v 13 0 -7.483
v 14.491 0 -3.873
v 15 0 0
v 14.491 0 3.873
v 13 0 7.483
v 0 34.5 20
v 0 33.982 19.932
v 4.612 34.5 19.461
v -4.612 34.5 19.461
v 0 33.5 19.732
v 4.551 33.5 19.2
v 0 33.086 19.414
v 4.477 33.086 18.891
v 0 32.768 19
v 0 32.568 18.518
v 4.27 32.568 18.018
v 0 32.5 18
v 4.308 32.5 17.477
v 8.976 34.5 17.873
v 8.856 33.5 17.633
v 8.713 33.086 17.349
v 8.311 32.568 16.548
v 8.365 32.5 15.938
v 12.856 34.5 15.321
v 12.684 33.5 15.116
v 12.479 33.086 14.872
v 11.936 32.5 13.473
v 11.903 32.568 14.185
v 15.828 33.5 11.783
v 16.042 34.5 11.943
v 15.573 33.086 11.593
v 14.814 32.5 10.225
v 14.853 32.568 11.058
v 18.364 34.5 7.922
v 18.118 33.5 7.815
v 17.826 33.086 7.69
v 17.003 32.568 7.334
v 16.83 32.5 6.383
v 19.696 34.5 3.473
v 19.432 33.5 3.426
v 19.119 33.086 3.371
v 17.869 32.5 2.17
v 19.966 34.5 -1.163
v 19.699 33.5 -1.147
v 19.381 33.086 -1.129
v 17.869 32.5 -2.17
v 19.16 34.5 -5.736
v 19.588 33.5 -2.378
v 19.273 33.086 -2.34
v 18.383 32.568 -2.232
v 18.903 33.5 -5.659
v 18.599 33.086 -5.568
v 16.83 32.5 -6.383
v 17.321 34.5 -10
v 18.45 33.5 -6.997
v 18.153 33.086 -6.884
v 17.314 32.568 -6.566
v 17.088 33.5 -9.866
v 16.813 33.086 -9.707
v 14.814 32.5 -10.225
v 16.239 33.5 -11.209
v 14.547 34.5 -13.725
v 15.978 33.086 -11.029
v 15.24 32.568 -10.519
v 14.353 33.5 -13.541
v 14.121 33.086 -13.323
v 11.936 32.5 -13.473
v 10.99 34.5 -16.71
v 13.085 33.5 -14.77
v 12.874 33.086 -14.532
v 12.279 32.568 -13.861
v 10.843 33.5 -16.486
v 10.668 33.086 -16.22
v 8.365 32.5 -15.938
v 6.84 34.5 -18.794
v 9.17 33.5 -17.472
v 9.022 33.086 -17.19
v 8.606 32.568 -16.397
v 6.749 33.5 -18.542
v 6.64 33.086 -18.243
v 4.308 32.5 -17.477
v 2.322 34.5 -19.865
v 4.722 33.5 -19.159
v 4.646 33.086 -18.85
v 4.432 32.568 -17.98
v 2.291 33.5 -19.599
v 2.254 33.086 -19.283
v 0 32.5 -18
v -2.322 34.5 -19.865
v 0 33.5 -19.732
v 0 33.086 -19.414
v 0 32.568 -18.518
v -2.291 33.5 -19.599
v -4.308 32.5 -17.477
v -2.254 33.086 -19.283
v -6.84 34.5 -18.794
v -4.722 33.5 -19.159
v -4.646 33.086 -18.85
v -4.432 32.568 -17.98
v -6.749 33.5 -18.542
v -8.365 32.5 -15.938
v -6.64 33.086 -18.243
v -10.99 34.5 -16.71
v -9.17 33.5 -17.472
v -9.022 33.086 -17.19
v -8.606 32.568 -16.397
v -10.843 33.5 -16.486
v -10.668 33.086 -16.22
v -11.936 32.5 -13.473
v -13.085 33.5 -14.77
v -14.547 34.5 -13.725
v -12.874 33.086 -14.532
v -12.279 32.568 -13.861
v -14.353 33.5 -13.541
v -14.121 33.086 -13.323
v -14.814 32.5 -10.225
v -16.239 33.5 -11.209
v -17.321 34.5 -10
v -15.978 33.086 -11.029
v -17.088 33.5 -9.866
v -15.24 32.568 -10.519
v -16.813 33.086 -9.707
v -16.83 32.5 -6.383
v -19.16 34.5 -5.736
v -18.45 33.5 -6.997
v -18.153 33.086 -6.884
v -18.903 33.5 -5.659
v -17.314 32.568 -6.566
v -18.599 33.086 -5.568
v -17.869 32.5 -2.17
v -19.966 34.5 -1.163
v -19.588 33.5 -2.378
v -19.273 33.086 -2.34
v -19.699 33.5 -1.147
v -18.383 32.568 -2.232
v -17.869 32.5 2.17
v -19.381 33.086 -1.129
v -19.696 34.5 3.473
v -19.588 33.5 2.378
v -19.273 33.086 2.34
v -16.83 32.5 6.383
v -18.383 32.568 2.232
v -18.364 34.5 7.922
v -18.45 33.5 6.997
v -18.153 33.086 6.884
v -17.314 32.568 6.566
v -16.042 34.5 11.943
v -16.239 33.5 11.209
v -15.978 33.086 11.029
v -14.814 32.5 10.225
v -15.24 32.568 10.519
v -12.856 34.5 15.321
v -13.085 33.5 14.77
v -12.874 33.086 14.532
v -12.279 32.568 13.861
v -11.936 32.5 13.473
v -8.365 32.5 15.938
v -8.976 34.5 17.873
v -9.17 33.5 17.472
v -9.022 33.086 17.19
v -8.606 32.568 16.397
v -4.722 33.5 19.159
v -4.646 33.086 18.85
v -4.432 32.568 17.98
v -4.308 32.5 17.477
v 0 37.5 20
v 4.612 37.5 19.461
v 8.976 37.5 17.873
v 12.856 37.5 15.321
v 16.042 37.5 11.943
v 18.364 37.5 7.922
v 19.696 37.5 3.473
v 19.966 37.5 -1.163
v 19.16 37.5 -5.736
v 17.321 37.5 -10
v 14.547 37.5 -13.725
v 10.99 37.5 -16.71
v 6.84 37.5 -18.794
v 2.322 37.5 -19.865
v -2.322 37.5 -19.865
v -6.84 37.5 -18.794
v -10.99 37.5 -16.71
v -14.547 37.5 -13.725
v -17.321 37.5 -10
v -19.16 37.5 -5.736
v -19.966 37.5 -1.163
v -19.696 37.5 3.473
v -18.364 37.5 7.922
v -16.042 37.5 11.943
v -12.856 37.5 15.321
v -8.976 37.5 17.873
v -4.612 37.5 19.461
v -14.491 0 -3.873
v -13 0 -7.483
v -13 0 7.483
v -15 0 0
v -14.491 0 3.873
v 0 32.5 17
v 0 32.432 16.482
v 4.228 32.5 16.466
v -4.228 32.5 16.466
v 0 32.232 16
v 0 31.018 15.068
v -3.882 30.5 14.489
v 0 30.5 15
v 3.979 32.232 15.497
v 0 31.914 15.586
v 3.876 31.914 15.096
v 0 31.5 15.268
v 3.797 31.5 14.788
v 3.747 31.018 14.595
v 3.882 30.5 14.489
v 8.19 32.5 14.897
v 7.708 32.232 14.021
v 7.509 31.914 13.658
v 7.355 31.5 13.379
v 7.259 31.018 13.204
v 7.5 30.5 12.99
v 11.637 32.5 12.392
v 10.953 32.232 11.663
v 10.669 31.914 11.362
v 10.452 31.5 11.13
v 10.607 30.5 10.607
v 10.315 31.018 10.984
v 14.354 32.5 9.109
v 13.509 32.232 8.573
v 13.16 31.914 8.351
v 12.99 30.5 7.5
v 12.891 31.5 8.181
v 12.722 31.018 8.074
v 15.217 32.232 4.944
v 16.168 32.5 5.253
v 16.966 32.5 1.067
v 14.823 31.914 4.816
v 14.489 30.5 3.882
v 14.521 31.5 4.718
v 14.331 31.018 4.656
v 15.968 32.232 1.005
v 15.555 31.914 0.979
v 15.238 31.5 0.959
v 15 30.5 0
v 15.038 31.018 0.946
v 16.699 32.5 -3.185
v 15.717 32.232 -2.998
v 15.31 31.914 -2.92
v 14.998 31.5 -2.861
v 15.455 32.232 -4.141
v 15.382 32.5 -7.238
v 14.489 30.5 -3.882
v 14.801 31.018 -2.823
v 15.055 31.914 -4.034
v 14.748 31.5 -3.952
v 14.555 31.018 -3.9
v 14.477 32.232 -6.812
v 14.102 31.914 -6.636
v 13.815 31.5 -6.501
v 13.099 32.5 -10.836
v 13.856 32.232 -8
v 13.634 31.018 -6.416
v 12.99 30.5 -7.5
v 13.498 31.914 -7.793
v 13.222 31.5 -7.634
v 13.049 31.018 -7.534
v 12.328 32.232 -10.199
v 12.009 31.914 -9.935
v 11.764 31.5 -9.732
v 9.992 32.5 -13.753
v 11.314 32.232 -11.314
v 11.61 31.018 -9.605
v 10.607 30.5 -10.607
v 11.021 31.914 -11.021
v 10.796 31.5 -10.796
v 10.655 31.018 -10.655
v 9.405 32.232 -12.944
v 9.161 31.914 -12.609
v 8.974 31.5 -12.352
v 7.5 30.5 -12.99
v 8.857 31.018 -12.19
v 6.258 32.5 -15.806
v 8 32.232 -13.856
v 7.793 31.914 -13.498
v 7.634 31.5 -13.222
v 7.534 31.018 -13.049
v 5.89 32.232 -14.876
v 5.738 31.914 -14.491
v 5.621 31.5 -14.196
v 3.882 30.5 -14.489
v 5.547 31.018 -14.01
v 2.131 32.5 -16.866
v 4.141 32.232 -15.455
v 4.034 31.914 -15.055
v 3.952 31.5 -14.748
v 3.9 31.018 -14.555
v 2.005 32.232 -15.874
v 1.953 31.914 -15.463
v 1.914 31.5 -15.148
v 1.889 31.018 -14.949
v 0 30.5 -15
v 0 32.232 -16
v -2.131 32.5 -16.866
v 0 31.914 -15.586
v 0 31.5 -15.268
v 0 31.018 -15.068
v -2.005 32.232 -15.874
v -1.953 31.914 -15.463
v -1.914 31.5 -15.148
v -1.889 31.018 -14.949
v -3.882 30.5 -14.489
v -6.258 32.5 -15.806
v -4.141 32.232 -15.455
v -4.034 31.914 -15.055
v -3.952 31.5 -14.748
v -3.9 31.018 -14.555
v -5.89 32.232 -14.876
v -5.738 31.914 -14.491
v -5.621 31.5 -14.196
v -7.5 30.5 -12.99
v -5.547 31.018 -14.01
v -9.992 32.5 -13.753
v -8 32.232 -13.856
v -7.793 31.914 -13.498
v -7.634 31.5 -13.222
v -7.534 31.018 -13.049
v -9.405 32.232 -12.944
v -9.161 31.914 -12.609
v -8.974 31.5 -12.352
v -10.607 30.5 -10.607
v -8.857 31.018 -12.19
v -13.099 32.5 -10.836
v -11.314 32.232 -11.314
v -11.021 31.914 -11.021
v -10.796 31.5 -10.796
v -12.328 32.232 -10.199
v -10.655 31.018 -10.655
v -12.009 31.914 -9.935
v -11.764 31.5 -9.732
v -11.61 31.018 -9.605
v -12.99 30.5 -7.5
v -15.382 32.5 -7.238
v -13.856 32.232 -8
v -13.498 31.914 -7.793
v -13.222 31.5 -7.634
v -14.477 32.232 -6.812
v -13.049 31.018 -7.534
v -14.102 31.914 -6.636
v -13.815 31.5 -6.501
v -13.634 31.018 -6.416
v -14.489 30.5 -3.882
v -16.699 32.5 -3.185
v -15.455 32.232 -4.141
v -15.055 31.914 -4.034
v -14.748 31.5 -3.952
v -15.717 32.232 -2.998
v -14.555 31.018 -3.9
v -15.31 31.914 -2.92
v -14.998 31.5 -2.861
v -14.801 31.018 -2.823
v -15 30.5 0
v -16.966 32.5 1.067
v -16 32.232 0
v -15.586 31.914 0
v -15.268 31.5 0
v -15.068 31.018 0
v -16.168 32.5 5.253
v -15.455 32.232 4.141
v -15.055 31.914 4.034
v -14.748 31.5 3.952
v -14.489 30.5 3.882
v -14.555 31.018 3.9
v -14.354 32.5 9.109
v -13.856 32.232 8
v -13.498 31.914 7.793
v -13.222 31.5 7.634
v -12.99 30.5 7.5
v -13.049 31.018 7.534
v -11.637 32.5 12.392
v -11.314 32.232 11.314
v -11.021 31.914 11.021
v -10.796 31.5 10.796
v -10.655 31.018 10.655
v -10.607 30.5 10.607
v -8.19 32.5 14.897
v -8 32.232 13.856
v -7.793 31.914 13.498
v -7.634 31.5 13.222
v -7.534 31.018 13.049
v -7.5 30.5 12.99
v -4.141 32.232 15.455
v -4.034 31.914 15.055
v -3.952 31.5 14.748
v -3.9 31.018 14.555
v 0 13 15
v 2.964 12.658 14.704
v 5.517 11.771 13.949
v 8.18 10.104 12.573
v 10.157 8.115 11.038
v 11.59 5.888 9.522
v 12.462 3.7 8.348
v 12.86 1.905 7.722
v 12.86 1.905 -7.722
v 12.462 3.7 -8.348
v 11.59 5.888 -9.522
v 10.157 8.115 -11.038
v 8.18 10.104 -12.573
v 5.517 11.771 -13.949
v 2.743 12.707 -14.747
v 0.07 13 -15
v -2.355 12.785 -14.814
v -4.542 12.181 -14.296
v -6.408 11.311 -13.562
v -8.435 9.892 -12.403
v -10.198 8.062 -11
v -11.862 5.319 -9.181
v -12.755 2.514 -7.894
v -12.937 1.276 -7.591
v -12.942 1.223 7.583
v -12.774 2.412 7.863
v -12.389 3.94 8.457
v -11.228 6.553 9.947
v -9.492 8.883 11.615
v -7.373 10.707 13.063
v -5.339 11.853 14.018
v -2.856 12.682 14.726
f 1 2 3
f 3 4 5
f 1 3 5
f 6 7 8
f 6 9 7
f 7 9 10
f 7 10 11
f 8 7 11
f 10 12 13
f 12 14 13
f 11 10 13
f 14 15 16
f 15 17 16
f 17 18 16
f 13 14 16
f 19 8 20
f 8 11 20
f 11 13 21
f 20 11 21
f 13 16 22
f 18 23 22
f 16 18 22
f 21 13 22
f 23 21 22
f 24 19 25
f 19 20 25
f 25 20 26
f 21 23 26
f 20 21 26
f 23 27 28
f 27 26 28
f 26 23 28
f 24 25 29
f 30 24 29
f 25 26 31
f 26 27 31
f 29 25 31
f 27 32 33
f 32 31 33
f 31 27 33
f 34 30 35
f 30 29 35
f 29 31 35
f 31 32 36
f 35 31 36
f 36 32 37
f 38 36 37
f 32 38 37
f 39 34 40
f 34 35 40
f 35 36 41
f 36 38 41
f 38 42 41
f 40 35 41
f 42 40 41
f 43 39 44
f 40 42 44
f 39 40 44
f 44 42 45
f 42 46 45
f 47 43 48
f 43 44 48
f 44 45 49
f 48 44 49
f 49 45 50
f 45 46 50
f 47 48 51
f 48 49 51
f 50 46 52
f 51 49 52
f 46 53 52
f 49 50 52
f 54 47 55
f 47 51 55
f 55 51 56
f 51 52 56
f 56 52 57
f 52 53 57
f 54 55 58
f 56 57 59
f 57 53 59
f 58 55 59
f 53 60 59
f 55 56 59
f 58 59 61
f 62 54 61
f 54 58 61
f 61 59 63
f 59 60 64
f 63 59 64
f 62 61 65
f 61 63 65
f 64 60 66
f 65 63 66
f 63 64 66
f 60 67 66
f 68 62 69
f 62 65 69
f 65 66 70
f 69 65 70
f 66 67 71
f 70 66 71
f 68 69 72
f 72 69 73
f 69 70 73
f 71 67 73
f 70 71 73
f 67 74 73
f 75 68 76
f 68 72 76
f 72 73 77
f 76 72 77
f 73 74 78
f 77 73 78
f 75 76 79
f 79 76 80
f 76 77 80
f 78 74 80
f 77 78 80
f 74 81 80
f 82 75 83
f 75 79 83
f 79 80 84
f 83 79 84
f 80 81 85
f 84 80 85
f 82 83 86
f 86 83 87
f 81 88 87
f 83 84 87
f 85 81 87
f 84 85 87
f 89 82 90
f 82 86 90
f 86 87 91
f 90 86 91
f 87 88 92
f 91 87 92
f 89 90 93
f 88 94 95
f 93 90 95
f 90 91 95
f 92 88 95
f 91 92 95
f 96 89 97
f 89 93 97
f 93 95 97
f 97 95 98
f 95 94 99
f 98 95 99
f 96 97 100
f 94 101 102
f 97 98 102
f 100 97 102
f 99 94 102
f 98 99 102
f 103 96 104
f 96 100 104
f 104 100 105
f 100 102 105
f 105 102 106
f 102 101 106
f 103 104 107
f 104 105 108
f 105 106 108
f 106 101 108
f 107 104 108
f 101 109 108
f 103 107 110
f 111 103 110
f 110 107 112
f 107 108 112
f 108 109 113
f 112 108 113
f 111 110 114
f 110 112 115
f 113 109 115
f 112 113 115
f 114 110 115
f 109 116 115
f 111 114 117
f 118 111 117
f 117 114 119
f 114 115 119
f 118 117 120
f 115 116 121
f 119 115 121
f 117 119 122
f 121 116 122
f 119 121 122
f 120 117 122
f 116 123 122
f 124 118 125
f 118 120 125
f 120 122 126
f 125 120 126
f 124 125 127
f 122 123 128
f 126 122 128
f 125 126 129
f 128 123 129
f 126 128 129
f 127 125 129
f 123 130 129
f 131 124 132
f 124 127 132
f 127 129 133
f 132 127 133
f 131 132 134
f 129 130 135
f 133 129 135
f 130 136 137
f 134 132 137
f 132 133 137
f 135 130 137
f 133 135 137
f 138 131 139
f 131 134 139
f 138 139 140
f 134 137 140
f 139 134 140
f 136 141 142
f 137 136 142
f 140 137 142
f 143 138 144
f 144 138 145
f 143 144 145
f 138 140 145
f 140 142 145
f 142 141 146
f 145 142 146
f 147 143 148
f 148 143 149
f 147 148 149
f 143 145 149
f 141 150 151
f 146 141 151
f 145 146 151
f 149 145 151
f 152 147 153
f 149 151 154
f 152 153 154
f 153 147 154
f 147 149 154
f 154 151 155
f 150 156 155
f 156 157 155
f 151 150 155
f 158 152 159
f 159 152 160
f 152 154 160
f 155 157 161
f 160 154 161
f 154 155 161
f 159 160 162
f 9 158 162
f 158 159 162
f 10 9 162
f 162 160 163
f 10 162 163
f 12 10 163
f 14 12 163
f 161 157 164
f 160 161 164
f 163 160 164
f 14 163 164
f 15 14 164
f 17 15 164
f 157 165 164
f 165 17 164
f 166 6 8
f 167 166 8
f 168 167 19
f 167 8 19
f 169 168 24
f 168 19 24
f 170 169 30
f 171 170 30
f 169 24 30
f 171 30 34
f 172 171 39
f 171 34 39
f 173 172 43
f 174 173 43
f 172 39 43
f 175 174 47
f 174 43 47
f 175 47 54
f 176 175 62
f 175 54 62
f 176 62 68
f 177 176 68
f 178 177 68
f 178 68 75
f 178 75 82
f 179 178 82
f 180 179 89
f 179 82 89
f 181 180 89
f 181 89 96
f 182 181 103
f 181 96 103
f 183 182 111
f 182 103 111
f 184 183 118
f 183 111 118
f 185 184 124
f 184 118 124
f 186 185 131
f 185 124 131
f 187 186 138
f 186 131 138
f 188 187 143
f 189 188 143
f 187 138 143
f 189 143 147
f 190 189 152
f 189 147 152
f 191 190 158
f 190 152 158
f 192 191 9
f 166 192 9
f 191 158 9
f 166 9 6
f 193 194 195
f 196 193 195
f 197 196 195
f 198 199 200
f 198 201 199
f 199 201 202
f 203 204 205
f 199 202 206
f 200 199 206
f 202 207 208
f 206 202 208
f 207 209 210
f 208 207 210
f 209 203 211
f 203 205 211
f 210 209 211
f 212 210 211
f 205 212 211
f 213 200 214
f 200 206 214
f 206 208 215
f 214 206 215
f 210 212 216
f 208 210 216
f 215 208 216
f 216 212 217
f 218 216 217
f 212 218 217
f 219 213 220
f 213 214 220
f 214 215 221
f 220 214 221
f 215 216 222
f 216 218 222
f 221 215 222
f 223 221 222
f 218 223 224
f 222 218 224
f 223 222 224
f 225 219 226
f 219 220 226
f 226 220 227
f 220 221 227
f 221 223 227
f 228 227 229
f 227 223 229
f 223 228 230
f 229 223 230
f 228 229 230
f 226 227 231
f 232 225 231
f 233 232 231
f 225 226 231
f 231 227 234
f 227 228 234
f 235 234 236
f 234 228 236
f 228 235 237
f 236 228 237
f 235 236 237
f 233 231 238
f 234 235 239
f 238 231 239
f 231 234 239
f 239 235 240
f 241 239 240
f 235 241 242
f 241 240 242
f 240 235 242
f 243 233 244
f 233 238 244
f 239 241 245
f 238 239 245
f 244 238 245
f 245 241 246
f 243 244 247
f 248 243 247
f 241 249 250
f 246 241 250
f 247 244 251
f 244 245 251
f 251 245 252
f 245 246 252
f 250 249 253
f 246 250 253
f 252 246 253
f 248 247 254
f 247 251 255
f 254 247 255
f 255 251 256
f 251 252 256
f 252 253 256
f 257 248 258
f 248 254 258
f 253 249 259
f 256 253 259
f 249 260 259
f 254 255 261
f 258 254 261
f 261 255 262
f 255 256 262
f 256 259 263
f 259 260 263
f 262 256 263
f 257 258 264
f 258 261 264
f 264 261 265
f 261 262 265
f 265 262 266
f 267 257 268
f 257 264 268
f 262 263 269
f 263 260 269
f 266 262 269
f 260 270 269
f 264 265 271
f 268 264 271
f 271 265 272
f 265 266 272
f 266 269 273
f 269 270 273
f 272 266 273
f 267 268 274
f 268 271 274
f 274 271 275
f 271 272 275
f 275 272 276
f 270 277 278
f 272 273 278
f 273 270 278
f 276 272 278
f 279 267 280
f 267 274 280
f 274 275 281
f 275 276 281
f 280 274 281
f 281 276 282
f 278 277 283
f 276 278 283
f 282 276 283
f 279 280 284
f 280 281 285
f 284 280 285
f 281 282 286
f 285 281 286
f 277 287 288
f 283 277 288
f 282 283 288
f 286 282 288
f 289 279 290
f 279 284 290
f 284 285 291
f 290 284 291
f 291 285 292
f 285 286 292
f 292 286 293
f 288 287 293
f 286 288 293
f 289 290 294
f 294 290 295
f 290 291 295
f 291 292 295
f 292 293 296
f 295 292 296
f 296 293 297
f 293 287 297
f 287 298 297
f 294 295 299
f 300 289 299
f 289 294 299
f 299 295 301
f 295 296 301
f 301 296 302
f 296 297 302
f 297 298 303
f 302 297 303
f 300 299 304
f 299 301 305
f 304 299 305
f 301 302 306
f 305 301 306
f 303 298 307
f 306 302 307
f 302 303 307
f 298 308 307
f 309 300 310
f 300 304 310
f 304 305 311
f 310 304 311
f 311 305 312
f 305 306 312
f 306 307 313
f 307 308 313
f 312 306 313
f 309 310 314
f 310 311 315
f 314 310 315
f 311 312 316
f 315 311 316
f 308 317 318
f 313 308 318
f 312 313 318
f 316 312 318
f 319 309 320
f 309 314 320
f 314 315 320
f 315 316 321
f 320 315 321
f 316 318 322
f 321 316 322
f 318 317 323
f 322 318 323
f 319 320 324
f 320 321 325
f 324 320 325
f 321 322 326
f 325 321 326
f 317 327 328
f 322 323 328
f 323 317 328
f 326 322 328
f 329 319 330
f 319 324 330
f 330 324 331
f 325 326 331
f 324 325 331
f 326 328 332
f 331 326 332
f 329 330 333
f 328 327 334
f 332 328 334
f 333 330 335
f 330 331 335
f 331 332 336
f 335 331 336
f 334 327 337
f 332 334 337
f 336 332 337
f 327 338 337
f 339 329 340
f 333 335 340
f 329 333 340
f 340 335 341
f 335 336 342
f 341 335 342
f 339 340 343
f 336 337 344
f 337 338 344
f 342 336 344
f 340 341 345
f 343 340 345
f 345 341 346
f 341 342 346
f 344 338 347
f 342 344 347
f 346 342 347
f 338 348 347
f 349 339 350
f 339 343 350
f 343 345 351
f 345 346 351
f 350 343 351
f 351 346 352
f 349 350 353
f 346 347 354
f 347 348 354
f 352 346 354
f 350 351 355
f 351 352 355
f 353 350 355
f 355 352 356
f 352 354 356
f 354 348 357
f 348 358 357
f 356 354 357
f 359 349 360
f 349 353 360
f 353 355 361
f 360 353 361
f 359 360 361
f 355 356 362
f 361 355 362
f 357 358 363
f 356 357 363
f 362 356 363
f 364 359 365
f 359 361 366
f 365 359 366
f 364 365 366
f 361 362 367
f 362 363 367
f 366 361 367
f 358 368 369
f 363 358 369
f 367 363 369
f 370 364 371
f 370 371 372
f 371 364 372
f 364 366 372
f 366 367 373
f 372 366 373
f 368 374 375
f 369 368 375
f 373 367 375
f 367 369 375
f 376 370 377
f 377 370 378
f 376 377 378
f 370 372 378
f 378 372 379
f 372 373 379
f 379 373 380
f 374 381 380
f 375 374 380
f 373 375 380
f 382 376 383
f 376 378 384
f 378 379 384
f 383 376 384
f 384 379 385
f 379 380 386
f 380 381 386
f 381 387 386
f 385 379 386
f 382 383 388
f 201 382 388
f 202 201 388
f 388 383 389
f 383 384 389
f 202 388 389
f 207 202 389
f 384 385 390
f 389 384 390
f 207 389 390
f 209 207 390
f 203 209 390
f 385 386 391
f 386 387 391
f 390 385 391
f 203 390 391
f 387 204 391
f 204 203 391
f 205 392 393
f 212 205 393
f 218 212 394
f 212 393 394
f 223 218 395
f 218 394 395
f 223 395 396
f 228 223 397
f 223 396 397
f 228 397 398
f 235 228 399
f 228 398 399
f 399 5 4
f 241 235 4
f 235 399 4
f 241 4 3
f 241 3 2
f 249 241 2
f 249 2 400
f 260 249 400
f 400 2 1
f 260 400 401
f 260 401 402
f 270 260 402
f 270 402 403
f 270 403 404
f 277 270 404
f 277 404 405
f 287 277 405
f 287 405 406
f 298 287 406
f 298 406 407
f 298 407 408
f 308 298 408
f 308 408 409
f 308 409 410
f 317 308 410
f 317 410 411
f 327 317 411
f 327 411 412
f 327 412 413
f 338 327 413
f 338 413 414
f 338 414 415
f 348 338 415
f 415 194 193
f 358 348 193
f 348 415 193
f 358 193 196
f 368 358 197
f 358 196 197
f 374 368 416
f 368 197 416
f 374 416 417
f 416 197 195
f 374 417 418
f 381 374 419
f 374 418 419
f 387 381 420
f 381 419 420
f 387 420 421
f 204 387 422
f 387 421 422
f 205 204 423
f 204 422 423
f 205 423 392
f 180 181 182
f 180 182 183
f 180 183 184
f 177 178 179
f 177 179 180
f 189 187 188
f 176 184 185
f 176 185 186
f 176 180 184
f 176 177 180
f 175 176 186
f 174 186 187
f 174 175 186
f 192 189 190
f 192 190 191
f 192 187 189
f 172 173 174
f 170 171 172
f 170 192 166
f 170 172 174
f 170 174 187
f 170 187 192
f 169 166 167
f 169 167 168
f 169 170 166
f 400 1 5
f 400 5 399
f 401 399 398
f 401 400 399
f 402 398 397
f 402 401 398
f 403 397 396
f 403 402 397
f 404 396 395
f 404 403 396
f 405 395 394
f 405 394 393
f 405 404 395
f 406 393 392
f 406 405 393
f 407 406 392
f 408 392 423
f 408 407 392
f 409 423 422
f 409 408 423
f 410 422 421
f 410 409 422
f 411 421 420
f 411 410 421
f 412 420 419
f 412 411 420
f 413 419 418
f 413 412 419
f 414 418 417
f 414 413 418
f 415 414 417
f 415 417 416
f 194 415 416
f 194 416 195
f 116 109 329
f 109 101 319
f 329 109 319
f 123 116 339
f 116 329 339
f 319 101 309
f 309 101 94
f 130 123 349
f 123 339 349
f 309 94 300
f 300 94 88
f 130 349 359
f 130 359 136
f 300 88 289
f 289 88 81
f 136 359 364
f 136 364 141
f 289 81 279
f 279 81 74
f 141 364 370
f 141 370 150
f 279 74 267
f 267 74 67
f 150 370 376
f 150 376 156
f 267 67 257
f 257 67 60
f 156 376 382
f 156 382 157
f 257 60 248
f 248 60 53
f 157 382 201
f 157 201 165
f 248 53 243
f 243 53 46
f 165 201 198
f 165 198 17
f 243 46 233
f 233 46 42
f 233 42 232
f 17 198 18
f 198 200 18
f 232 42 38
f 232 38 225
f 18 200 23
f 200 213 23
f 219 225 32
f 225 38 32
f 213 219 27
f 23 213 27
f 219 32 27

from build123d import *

# Parameters (mm, degrees)
SKETCH2_R               = 15
BOSS_EXTRUDE1_DEPTH     = 32.5
CUT_EXTRUDE1_DEPTH      = 50
CUT_EXTRUDE1_DEPTH_BACK = 50
SKETCH3_R               = 13
SKETCH5_R               = 20
BOSS_EXTRUDE2_DEPTH     = 5
FILLET1_R               = 2


with BuildPart() as part:
    # Sketch2 → Boss-Extrude1 (new body)
    with BuildSketch(Plane(origin=(0, 0, 0), x_dir=(1, 0, 0), z_dir=(0, 1, 0))):
        Circle(SKETCH2_R)
    extrude(amount=BOSS_EXTRUDE1_DEPTH)

    # Sketch3 → Cut-Extrude1 (cut, two sides: drawn at the far end of the back side and taken through both)
    with BuildSketch(Plane.XY.offset(-CUT_EXTRUDE1_DEPTH_BACK)):
        Circle(SKETCH3_R)
    extrude(amount=CUT_EXTRUDE1_DEPTH + CUT_EXTRUDE1_DEPTH_BACK, mode=Mode.SUBTRACT)

    # Sketch5 → Boss-Extrude2 (add)
    with BuildSketch(Plane(origin=(0, 32.5, 0), x_dir=(1, 0, 0), z_dir=(0, 1, 0))):
        Circle(SKETCH5_R)
    extrude(amount=BOSS_EXTRUDE2_DEPTH)

    # Fillet1
    fillet1_edges = [part.edges().sort_by_distance(p)[0] for p in [
        (-20, 32.5, 0),
        (-15, 32.5, 0),
    ]]
    fillet(fillet1_edges, radius=FILLET1_R)


solid = part.part
